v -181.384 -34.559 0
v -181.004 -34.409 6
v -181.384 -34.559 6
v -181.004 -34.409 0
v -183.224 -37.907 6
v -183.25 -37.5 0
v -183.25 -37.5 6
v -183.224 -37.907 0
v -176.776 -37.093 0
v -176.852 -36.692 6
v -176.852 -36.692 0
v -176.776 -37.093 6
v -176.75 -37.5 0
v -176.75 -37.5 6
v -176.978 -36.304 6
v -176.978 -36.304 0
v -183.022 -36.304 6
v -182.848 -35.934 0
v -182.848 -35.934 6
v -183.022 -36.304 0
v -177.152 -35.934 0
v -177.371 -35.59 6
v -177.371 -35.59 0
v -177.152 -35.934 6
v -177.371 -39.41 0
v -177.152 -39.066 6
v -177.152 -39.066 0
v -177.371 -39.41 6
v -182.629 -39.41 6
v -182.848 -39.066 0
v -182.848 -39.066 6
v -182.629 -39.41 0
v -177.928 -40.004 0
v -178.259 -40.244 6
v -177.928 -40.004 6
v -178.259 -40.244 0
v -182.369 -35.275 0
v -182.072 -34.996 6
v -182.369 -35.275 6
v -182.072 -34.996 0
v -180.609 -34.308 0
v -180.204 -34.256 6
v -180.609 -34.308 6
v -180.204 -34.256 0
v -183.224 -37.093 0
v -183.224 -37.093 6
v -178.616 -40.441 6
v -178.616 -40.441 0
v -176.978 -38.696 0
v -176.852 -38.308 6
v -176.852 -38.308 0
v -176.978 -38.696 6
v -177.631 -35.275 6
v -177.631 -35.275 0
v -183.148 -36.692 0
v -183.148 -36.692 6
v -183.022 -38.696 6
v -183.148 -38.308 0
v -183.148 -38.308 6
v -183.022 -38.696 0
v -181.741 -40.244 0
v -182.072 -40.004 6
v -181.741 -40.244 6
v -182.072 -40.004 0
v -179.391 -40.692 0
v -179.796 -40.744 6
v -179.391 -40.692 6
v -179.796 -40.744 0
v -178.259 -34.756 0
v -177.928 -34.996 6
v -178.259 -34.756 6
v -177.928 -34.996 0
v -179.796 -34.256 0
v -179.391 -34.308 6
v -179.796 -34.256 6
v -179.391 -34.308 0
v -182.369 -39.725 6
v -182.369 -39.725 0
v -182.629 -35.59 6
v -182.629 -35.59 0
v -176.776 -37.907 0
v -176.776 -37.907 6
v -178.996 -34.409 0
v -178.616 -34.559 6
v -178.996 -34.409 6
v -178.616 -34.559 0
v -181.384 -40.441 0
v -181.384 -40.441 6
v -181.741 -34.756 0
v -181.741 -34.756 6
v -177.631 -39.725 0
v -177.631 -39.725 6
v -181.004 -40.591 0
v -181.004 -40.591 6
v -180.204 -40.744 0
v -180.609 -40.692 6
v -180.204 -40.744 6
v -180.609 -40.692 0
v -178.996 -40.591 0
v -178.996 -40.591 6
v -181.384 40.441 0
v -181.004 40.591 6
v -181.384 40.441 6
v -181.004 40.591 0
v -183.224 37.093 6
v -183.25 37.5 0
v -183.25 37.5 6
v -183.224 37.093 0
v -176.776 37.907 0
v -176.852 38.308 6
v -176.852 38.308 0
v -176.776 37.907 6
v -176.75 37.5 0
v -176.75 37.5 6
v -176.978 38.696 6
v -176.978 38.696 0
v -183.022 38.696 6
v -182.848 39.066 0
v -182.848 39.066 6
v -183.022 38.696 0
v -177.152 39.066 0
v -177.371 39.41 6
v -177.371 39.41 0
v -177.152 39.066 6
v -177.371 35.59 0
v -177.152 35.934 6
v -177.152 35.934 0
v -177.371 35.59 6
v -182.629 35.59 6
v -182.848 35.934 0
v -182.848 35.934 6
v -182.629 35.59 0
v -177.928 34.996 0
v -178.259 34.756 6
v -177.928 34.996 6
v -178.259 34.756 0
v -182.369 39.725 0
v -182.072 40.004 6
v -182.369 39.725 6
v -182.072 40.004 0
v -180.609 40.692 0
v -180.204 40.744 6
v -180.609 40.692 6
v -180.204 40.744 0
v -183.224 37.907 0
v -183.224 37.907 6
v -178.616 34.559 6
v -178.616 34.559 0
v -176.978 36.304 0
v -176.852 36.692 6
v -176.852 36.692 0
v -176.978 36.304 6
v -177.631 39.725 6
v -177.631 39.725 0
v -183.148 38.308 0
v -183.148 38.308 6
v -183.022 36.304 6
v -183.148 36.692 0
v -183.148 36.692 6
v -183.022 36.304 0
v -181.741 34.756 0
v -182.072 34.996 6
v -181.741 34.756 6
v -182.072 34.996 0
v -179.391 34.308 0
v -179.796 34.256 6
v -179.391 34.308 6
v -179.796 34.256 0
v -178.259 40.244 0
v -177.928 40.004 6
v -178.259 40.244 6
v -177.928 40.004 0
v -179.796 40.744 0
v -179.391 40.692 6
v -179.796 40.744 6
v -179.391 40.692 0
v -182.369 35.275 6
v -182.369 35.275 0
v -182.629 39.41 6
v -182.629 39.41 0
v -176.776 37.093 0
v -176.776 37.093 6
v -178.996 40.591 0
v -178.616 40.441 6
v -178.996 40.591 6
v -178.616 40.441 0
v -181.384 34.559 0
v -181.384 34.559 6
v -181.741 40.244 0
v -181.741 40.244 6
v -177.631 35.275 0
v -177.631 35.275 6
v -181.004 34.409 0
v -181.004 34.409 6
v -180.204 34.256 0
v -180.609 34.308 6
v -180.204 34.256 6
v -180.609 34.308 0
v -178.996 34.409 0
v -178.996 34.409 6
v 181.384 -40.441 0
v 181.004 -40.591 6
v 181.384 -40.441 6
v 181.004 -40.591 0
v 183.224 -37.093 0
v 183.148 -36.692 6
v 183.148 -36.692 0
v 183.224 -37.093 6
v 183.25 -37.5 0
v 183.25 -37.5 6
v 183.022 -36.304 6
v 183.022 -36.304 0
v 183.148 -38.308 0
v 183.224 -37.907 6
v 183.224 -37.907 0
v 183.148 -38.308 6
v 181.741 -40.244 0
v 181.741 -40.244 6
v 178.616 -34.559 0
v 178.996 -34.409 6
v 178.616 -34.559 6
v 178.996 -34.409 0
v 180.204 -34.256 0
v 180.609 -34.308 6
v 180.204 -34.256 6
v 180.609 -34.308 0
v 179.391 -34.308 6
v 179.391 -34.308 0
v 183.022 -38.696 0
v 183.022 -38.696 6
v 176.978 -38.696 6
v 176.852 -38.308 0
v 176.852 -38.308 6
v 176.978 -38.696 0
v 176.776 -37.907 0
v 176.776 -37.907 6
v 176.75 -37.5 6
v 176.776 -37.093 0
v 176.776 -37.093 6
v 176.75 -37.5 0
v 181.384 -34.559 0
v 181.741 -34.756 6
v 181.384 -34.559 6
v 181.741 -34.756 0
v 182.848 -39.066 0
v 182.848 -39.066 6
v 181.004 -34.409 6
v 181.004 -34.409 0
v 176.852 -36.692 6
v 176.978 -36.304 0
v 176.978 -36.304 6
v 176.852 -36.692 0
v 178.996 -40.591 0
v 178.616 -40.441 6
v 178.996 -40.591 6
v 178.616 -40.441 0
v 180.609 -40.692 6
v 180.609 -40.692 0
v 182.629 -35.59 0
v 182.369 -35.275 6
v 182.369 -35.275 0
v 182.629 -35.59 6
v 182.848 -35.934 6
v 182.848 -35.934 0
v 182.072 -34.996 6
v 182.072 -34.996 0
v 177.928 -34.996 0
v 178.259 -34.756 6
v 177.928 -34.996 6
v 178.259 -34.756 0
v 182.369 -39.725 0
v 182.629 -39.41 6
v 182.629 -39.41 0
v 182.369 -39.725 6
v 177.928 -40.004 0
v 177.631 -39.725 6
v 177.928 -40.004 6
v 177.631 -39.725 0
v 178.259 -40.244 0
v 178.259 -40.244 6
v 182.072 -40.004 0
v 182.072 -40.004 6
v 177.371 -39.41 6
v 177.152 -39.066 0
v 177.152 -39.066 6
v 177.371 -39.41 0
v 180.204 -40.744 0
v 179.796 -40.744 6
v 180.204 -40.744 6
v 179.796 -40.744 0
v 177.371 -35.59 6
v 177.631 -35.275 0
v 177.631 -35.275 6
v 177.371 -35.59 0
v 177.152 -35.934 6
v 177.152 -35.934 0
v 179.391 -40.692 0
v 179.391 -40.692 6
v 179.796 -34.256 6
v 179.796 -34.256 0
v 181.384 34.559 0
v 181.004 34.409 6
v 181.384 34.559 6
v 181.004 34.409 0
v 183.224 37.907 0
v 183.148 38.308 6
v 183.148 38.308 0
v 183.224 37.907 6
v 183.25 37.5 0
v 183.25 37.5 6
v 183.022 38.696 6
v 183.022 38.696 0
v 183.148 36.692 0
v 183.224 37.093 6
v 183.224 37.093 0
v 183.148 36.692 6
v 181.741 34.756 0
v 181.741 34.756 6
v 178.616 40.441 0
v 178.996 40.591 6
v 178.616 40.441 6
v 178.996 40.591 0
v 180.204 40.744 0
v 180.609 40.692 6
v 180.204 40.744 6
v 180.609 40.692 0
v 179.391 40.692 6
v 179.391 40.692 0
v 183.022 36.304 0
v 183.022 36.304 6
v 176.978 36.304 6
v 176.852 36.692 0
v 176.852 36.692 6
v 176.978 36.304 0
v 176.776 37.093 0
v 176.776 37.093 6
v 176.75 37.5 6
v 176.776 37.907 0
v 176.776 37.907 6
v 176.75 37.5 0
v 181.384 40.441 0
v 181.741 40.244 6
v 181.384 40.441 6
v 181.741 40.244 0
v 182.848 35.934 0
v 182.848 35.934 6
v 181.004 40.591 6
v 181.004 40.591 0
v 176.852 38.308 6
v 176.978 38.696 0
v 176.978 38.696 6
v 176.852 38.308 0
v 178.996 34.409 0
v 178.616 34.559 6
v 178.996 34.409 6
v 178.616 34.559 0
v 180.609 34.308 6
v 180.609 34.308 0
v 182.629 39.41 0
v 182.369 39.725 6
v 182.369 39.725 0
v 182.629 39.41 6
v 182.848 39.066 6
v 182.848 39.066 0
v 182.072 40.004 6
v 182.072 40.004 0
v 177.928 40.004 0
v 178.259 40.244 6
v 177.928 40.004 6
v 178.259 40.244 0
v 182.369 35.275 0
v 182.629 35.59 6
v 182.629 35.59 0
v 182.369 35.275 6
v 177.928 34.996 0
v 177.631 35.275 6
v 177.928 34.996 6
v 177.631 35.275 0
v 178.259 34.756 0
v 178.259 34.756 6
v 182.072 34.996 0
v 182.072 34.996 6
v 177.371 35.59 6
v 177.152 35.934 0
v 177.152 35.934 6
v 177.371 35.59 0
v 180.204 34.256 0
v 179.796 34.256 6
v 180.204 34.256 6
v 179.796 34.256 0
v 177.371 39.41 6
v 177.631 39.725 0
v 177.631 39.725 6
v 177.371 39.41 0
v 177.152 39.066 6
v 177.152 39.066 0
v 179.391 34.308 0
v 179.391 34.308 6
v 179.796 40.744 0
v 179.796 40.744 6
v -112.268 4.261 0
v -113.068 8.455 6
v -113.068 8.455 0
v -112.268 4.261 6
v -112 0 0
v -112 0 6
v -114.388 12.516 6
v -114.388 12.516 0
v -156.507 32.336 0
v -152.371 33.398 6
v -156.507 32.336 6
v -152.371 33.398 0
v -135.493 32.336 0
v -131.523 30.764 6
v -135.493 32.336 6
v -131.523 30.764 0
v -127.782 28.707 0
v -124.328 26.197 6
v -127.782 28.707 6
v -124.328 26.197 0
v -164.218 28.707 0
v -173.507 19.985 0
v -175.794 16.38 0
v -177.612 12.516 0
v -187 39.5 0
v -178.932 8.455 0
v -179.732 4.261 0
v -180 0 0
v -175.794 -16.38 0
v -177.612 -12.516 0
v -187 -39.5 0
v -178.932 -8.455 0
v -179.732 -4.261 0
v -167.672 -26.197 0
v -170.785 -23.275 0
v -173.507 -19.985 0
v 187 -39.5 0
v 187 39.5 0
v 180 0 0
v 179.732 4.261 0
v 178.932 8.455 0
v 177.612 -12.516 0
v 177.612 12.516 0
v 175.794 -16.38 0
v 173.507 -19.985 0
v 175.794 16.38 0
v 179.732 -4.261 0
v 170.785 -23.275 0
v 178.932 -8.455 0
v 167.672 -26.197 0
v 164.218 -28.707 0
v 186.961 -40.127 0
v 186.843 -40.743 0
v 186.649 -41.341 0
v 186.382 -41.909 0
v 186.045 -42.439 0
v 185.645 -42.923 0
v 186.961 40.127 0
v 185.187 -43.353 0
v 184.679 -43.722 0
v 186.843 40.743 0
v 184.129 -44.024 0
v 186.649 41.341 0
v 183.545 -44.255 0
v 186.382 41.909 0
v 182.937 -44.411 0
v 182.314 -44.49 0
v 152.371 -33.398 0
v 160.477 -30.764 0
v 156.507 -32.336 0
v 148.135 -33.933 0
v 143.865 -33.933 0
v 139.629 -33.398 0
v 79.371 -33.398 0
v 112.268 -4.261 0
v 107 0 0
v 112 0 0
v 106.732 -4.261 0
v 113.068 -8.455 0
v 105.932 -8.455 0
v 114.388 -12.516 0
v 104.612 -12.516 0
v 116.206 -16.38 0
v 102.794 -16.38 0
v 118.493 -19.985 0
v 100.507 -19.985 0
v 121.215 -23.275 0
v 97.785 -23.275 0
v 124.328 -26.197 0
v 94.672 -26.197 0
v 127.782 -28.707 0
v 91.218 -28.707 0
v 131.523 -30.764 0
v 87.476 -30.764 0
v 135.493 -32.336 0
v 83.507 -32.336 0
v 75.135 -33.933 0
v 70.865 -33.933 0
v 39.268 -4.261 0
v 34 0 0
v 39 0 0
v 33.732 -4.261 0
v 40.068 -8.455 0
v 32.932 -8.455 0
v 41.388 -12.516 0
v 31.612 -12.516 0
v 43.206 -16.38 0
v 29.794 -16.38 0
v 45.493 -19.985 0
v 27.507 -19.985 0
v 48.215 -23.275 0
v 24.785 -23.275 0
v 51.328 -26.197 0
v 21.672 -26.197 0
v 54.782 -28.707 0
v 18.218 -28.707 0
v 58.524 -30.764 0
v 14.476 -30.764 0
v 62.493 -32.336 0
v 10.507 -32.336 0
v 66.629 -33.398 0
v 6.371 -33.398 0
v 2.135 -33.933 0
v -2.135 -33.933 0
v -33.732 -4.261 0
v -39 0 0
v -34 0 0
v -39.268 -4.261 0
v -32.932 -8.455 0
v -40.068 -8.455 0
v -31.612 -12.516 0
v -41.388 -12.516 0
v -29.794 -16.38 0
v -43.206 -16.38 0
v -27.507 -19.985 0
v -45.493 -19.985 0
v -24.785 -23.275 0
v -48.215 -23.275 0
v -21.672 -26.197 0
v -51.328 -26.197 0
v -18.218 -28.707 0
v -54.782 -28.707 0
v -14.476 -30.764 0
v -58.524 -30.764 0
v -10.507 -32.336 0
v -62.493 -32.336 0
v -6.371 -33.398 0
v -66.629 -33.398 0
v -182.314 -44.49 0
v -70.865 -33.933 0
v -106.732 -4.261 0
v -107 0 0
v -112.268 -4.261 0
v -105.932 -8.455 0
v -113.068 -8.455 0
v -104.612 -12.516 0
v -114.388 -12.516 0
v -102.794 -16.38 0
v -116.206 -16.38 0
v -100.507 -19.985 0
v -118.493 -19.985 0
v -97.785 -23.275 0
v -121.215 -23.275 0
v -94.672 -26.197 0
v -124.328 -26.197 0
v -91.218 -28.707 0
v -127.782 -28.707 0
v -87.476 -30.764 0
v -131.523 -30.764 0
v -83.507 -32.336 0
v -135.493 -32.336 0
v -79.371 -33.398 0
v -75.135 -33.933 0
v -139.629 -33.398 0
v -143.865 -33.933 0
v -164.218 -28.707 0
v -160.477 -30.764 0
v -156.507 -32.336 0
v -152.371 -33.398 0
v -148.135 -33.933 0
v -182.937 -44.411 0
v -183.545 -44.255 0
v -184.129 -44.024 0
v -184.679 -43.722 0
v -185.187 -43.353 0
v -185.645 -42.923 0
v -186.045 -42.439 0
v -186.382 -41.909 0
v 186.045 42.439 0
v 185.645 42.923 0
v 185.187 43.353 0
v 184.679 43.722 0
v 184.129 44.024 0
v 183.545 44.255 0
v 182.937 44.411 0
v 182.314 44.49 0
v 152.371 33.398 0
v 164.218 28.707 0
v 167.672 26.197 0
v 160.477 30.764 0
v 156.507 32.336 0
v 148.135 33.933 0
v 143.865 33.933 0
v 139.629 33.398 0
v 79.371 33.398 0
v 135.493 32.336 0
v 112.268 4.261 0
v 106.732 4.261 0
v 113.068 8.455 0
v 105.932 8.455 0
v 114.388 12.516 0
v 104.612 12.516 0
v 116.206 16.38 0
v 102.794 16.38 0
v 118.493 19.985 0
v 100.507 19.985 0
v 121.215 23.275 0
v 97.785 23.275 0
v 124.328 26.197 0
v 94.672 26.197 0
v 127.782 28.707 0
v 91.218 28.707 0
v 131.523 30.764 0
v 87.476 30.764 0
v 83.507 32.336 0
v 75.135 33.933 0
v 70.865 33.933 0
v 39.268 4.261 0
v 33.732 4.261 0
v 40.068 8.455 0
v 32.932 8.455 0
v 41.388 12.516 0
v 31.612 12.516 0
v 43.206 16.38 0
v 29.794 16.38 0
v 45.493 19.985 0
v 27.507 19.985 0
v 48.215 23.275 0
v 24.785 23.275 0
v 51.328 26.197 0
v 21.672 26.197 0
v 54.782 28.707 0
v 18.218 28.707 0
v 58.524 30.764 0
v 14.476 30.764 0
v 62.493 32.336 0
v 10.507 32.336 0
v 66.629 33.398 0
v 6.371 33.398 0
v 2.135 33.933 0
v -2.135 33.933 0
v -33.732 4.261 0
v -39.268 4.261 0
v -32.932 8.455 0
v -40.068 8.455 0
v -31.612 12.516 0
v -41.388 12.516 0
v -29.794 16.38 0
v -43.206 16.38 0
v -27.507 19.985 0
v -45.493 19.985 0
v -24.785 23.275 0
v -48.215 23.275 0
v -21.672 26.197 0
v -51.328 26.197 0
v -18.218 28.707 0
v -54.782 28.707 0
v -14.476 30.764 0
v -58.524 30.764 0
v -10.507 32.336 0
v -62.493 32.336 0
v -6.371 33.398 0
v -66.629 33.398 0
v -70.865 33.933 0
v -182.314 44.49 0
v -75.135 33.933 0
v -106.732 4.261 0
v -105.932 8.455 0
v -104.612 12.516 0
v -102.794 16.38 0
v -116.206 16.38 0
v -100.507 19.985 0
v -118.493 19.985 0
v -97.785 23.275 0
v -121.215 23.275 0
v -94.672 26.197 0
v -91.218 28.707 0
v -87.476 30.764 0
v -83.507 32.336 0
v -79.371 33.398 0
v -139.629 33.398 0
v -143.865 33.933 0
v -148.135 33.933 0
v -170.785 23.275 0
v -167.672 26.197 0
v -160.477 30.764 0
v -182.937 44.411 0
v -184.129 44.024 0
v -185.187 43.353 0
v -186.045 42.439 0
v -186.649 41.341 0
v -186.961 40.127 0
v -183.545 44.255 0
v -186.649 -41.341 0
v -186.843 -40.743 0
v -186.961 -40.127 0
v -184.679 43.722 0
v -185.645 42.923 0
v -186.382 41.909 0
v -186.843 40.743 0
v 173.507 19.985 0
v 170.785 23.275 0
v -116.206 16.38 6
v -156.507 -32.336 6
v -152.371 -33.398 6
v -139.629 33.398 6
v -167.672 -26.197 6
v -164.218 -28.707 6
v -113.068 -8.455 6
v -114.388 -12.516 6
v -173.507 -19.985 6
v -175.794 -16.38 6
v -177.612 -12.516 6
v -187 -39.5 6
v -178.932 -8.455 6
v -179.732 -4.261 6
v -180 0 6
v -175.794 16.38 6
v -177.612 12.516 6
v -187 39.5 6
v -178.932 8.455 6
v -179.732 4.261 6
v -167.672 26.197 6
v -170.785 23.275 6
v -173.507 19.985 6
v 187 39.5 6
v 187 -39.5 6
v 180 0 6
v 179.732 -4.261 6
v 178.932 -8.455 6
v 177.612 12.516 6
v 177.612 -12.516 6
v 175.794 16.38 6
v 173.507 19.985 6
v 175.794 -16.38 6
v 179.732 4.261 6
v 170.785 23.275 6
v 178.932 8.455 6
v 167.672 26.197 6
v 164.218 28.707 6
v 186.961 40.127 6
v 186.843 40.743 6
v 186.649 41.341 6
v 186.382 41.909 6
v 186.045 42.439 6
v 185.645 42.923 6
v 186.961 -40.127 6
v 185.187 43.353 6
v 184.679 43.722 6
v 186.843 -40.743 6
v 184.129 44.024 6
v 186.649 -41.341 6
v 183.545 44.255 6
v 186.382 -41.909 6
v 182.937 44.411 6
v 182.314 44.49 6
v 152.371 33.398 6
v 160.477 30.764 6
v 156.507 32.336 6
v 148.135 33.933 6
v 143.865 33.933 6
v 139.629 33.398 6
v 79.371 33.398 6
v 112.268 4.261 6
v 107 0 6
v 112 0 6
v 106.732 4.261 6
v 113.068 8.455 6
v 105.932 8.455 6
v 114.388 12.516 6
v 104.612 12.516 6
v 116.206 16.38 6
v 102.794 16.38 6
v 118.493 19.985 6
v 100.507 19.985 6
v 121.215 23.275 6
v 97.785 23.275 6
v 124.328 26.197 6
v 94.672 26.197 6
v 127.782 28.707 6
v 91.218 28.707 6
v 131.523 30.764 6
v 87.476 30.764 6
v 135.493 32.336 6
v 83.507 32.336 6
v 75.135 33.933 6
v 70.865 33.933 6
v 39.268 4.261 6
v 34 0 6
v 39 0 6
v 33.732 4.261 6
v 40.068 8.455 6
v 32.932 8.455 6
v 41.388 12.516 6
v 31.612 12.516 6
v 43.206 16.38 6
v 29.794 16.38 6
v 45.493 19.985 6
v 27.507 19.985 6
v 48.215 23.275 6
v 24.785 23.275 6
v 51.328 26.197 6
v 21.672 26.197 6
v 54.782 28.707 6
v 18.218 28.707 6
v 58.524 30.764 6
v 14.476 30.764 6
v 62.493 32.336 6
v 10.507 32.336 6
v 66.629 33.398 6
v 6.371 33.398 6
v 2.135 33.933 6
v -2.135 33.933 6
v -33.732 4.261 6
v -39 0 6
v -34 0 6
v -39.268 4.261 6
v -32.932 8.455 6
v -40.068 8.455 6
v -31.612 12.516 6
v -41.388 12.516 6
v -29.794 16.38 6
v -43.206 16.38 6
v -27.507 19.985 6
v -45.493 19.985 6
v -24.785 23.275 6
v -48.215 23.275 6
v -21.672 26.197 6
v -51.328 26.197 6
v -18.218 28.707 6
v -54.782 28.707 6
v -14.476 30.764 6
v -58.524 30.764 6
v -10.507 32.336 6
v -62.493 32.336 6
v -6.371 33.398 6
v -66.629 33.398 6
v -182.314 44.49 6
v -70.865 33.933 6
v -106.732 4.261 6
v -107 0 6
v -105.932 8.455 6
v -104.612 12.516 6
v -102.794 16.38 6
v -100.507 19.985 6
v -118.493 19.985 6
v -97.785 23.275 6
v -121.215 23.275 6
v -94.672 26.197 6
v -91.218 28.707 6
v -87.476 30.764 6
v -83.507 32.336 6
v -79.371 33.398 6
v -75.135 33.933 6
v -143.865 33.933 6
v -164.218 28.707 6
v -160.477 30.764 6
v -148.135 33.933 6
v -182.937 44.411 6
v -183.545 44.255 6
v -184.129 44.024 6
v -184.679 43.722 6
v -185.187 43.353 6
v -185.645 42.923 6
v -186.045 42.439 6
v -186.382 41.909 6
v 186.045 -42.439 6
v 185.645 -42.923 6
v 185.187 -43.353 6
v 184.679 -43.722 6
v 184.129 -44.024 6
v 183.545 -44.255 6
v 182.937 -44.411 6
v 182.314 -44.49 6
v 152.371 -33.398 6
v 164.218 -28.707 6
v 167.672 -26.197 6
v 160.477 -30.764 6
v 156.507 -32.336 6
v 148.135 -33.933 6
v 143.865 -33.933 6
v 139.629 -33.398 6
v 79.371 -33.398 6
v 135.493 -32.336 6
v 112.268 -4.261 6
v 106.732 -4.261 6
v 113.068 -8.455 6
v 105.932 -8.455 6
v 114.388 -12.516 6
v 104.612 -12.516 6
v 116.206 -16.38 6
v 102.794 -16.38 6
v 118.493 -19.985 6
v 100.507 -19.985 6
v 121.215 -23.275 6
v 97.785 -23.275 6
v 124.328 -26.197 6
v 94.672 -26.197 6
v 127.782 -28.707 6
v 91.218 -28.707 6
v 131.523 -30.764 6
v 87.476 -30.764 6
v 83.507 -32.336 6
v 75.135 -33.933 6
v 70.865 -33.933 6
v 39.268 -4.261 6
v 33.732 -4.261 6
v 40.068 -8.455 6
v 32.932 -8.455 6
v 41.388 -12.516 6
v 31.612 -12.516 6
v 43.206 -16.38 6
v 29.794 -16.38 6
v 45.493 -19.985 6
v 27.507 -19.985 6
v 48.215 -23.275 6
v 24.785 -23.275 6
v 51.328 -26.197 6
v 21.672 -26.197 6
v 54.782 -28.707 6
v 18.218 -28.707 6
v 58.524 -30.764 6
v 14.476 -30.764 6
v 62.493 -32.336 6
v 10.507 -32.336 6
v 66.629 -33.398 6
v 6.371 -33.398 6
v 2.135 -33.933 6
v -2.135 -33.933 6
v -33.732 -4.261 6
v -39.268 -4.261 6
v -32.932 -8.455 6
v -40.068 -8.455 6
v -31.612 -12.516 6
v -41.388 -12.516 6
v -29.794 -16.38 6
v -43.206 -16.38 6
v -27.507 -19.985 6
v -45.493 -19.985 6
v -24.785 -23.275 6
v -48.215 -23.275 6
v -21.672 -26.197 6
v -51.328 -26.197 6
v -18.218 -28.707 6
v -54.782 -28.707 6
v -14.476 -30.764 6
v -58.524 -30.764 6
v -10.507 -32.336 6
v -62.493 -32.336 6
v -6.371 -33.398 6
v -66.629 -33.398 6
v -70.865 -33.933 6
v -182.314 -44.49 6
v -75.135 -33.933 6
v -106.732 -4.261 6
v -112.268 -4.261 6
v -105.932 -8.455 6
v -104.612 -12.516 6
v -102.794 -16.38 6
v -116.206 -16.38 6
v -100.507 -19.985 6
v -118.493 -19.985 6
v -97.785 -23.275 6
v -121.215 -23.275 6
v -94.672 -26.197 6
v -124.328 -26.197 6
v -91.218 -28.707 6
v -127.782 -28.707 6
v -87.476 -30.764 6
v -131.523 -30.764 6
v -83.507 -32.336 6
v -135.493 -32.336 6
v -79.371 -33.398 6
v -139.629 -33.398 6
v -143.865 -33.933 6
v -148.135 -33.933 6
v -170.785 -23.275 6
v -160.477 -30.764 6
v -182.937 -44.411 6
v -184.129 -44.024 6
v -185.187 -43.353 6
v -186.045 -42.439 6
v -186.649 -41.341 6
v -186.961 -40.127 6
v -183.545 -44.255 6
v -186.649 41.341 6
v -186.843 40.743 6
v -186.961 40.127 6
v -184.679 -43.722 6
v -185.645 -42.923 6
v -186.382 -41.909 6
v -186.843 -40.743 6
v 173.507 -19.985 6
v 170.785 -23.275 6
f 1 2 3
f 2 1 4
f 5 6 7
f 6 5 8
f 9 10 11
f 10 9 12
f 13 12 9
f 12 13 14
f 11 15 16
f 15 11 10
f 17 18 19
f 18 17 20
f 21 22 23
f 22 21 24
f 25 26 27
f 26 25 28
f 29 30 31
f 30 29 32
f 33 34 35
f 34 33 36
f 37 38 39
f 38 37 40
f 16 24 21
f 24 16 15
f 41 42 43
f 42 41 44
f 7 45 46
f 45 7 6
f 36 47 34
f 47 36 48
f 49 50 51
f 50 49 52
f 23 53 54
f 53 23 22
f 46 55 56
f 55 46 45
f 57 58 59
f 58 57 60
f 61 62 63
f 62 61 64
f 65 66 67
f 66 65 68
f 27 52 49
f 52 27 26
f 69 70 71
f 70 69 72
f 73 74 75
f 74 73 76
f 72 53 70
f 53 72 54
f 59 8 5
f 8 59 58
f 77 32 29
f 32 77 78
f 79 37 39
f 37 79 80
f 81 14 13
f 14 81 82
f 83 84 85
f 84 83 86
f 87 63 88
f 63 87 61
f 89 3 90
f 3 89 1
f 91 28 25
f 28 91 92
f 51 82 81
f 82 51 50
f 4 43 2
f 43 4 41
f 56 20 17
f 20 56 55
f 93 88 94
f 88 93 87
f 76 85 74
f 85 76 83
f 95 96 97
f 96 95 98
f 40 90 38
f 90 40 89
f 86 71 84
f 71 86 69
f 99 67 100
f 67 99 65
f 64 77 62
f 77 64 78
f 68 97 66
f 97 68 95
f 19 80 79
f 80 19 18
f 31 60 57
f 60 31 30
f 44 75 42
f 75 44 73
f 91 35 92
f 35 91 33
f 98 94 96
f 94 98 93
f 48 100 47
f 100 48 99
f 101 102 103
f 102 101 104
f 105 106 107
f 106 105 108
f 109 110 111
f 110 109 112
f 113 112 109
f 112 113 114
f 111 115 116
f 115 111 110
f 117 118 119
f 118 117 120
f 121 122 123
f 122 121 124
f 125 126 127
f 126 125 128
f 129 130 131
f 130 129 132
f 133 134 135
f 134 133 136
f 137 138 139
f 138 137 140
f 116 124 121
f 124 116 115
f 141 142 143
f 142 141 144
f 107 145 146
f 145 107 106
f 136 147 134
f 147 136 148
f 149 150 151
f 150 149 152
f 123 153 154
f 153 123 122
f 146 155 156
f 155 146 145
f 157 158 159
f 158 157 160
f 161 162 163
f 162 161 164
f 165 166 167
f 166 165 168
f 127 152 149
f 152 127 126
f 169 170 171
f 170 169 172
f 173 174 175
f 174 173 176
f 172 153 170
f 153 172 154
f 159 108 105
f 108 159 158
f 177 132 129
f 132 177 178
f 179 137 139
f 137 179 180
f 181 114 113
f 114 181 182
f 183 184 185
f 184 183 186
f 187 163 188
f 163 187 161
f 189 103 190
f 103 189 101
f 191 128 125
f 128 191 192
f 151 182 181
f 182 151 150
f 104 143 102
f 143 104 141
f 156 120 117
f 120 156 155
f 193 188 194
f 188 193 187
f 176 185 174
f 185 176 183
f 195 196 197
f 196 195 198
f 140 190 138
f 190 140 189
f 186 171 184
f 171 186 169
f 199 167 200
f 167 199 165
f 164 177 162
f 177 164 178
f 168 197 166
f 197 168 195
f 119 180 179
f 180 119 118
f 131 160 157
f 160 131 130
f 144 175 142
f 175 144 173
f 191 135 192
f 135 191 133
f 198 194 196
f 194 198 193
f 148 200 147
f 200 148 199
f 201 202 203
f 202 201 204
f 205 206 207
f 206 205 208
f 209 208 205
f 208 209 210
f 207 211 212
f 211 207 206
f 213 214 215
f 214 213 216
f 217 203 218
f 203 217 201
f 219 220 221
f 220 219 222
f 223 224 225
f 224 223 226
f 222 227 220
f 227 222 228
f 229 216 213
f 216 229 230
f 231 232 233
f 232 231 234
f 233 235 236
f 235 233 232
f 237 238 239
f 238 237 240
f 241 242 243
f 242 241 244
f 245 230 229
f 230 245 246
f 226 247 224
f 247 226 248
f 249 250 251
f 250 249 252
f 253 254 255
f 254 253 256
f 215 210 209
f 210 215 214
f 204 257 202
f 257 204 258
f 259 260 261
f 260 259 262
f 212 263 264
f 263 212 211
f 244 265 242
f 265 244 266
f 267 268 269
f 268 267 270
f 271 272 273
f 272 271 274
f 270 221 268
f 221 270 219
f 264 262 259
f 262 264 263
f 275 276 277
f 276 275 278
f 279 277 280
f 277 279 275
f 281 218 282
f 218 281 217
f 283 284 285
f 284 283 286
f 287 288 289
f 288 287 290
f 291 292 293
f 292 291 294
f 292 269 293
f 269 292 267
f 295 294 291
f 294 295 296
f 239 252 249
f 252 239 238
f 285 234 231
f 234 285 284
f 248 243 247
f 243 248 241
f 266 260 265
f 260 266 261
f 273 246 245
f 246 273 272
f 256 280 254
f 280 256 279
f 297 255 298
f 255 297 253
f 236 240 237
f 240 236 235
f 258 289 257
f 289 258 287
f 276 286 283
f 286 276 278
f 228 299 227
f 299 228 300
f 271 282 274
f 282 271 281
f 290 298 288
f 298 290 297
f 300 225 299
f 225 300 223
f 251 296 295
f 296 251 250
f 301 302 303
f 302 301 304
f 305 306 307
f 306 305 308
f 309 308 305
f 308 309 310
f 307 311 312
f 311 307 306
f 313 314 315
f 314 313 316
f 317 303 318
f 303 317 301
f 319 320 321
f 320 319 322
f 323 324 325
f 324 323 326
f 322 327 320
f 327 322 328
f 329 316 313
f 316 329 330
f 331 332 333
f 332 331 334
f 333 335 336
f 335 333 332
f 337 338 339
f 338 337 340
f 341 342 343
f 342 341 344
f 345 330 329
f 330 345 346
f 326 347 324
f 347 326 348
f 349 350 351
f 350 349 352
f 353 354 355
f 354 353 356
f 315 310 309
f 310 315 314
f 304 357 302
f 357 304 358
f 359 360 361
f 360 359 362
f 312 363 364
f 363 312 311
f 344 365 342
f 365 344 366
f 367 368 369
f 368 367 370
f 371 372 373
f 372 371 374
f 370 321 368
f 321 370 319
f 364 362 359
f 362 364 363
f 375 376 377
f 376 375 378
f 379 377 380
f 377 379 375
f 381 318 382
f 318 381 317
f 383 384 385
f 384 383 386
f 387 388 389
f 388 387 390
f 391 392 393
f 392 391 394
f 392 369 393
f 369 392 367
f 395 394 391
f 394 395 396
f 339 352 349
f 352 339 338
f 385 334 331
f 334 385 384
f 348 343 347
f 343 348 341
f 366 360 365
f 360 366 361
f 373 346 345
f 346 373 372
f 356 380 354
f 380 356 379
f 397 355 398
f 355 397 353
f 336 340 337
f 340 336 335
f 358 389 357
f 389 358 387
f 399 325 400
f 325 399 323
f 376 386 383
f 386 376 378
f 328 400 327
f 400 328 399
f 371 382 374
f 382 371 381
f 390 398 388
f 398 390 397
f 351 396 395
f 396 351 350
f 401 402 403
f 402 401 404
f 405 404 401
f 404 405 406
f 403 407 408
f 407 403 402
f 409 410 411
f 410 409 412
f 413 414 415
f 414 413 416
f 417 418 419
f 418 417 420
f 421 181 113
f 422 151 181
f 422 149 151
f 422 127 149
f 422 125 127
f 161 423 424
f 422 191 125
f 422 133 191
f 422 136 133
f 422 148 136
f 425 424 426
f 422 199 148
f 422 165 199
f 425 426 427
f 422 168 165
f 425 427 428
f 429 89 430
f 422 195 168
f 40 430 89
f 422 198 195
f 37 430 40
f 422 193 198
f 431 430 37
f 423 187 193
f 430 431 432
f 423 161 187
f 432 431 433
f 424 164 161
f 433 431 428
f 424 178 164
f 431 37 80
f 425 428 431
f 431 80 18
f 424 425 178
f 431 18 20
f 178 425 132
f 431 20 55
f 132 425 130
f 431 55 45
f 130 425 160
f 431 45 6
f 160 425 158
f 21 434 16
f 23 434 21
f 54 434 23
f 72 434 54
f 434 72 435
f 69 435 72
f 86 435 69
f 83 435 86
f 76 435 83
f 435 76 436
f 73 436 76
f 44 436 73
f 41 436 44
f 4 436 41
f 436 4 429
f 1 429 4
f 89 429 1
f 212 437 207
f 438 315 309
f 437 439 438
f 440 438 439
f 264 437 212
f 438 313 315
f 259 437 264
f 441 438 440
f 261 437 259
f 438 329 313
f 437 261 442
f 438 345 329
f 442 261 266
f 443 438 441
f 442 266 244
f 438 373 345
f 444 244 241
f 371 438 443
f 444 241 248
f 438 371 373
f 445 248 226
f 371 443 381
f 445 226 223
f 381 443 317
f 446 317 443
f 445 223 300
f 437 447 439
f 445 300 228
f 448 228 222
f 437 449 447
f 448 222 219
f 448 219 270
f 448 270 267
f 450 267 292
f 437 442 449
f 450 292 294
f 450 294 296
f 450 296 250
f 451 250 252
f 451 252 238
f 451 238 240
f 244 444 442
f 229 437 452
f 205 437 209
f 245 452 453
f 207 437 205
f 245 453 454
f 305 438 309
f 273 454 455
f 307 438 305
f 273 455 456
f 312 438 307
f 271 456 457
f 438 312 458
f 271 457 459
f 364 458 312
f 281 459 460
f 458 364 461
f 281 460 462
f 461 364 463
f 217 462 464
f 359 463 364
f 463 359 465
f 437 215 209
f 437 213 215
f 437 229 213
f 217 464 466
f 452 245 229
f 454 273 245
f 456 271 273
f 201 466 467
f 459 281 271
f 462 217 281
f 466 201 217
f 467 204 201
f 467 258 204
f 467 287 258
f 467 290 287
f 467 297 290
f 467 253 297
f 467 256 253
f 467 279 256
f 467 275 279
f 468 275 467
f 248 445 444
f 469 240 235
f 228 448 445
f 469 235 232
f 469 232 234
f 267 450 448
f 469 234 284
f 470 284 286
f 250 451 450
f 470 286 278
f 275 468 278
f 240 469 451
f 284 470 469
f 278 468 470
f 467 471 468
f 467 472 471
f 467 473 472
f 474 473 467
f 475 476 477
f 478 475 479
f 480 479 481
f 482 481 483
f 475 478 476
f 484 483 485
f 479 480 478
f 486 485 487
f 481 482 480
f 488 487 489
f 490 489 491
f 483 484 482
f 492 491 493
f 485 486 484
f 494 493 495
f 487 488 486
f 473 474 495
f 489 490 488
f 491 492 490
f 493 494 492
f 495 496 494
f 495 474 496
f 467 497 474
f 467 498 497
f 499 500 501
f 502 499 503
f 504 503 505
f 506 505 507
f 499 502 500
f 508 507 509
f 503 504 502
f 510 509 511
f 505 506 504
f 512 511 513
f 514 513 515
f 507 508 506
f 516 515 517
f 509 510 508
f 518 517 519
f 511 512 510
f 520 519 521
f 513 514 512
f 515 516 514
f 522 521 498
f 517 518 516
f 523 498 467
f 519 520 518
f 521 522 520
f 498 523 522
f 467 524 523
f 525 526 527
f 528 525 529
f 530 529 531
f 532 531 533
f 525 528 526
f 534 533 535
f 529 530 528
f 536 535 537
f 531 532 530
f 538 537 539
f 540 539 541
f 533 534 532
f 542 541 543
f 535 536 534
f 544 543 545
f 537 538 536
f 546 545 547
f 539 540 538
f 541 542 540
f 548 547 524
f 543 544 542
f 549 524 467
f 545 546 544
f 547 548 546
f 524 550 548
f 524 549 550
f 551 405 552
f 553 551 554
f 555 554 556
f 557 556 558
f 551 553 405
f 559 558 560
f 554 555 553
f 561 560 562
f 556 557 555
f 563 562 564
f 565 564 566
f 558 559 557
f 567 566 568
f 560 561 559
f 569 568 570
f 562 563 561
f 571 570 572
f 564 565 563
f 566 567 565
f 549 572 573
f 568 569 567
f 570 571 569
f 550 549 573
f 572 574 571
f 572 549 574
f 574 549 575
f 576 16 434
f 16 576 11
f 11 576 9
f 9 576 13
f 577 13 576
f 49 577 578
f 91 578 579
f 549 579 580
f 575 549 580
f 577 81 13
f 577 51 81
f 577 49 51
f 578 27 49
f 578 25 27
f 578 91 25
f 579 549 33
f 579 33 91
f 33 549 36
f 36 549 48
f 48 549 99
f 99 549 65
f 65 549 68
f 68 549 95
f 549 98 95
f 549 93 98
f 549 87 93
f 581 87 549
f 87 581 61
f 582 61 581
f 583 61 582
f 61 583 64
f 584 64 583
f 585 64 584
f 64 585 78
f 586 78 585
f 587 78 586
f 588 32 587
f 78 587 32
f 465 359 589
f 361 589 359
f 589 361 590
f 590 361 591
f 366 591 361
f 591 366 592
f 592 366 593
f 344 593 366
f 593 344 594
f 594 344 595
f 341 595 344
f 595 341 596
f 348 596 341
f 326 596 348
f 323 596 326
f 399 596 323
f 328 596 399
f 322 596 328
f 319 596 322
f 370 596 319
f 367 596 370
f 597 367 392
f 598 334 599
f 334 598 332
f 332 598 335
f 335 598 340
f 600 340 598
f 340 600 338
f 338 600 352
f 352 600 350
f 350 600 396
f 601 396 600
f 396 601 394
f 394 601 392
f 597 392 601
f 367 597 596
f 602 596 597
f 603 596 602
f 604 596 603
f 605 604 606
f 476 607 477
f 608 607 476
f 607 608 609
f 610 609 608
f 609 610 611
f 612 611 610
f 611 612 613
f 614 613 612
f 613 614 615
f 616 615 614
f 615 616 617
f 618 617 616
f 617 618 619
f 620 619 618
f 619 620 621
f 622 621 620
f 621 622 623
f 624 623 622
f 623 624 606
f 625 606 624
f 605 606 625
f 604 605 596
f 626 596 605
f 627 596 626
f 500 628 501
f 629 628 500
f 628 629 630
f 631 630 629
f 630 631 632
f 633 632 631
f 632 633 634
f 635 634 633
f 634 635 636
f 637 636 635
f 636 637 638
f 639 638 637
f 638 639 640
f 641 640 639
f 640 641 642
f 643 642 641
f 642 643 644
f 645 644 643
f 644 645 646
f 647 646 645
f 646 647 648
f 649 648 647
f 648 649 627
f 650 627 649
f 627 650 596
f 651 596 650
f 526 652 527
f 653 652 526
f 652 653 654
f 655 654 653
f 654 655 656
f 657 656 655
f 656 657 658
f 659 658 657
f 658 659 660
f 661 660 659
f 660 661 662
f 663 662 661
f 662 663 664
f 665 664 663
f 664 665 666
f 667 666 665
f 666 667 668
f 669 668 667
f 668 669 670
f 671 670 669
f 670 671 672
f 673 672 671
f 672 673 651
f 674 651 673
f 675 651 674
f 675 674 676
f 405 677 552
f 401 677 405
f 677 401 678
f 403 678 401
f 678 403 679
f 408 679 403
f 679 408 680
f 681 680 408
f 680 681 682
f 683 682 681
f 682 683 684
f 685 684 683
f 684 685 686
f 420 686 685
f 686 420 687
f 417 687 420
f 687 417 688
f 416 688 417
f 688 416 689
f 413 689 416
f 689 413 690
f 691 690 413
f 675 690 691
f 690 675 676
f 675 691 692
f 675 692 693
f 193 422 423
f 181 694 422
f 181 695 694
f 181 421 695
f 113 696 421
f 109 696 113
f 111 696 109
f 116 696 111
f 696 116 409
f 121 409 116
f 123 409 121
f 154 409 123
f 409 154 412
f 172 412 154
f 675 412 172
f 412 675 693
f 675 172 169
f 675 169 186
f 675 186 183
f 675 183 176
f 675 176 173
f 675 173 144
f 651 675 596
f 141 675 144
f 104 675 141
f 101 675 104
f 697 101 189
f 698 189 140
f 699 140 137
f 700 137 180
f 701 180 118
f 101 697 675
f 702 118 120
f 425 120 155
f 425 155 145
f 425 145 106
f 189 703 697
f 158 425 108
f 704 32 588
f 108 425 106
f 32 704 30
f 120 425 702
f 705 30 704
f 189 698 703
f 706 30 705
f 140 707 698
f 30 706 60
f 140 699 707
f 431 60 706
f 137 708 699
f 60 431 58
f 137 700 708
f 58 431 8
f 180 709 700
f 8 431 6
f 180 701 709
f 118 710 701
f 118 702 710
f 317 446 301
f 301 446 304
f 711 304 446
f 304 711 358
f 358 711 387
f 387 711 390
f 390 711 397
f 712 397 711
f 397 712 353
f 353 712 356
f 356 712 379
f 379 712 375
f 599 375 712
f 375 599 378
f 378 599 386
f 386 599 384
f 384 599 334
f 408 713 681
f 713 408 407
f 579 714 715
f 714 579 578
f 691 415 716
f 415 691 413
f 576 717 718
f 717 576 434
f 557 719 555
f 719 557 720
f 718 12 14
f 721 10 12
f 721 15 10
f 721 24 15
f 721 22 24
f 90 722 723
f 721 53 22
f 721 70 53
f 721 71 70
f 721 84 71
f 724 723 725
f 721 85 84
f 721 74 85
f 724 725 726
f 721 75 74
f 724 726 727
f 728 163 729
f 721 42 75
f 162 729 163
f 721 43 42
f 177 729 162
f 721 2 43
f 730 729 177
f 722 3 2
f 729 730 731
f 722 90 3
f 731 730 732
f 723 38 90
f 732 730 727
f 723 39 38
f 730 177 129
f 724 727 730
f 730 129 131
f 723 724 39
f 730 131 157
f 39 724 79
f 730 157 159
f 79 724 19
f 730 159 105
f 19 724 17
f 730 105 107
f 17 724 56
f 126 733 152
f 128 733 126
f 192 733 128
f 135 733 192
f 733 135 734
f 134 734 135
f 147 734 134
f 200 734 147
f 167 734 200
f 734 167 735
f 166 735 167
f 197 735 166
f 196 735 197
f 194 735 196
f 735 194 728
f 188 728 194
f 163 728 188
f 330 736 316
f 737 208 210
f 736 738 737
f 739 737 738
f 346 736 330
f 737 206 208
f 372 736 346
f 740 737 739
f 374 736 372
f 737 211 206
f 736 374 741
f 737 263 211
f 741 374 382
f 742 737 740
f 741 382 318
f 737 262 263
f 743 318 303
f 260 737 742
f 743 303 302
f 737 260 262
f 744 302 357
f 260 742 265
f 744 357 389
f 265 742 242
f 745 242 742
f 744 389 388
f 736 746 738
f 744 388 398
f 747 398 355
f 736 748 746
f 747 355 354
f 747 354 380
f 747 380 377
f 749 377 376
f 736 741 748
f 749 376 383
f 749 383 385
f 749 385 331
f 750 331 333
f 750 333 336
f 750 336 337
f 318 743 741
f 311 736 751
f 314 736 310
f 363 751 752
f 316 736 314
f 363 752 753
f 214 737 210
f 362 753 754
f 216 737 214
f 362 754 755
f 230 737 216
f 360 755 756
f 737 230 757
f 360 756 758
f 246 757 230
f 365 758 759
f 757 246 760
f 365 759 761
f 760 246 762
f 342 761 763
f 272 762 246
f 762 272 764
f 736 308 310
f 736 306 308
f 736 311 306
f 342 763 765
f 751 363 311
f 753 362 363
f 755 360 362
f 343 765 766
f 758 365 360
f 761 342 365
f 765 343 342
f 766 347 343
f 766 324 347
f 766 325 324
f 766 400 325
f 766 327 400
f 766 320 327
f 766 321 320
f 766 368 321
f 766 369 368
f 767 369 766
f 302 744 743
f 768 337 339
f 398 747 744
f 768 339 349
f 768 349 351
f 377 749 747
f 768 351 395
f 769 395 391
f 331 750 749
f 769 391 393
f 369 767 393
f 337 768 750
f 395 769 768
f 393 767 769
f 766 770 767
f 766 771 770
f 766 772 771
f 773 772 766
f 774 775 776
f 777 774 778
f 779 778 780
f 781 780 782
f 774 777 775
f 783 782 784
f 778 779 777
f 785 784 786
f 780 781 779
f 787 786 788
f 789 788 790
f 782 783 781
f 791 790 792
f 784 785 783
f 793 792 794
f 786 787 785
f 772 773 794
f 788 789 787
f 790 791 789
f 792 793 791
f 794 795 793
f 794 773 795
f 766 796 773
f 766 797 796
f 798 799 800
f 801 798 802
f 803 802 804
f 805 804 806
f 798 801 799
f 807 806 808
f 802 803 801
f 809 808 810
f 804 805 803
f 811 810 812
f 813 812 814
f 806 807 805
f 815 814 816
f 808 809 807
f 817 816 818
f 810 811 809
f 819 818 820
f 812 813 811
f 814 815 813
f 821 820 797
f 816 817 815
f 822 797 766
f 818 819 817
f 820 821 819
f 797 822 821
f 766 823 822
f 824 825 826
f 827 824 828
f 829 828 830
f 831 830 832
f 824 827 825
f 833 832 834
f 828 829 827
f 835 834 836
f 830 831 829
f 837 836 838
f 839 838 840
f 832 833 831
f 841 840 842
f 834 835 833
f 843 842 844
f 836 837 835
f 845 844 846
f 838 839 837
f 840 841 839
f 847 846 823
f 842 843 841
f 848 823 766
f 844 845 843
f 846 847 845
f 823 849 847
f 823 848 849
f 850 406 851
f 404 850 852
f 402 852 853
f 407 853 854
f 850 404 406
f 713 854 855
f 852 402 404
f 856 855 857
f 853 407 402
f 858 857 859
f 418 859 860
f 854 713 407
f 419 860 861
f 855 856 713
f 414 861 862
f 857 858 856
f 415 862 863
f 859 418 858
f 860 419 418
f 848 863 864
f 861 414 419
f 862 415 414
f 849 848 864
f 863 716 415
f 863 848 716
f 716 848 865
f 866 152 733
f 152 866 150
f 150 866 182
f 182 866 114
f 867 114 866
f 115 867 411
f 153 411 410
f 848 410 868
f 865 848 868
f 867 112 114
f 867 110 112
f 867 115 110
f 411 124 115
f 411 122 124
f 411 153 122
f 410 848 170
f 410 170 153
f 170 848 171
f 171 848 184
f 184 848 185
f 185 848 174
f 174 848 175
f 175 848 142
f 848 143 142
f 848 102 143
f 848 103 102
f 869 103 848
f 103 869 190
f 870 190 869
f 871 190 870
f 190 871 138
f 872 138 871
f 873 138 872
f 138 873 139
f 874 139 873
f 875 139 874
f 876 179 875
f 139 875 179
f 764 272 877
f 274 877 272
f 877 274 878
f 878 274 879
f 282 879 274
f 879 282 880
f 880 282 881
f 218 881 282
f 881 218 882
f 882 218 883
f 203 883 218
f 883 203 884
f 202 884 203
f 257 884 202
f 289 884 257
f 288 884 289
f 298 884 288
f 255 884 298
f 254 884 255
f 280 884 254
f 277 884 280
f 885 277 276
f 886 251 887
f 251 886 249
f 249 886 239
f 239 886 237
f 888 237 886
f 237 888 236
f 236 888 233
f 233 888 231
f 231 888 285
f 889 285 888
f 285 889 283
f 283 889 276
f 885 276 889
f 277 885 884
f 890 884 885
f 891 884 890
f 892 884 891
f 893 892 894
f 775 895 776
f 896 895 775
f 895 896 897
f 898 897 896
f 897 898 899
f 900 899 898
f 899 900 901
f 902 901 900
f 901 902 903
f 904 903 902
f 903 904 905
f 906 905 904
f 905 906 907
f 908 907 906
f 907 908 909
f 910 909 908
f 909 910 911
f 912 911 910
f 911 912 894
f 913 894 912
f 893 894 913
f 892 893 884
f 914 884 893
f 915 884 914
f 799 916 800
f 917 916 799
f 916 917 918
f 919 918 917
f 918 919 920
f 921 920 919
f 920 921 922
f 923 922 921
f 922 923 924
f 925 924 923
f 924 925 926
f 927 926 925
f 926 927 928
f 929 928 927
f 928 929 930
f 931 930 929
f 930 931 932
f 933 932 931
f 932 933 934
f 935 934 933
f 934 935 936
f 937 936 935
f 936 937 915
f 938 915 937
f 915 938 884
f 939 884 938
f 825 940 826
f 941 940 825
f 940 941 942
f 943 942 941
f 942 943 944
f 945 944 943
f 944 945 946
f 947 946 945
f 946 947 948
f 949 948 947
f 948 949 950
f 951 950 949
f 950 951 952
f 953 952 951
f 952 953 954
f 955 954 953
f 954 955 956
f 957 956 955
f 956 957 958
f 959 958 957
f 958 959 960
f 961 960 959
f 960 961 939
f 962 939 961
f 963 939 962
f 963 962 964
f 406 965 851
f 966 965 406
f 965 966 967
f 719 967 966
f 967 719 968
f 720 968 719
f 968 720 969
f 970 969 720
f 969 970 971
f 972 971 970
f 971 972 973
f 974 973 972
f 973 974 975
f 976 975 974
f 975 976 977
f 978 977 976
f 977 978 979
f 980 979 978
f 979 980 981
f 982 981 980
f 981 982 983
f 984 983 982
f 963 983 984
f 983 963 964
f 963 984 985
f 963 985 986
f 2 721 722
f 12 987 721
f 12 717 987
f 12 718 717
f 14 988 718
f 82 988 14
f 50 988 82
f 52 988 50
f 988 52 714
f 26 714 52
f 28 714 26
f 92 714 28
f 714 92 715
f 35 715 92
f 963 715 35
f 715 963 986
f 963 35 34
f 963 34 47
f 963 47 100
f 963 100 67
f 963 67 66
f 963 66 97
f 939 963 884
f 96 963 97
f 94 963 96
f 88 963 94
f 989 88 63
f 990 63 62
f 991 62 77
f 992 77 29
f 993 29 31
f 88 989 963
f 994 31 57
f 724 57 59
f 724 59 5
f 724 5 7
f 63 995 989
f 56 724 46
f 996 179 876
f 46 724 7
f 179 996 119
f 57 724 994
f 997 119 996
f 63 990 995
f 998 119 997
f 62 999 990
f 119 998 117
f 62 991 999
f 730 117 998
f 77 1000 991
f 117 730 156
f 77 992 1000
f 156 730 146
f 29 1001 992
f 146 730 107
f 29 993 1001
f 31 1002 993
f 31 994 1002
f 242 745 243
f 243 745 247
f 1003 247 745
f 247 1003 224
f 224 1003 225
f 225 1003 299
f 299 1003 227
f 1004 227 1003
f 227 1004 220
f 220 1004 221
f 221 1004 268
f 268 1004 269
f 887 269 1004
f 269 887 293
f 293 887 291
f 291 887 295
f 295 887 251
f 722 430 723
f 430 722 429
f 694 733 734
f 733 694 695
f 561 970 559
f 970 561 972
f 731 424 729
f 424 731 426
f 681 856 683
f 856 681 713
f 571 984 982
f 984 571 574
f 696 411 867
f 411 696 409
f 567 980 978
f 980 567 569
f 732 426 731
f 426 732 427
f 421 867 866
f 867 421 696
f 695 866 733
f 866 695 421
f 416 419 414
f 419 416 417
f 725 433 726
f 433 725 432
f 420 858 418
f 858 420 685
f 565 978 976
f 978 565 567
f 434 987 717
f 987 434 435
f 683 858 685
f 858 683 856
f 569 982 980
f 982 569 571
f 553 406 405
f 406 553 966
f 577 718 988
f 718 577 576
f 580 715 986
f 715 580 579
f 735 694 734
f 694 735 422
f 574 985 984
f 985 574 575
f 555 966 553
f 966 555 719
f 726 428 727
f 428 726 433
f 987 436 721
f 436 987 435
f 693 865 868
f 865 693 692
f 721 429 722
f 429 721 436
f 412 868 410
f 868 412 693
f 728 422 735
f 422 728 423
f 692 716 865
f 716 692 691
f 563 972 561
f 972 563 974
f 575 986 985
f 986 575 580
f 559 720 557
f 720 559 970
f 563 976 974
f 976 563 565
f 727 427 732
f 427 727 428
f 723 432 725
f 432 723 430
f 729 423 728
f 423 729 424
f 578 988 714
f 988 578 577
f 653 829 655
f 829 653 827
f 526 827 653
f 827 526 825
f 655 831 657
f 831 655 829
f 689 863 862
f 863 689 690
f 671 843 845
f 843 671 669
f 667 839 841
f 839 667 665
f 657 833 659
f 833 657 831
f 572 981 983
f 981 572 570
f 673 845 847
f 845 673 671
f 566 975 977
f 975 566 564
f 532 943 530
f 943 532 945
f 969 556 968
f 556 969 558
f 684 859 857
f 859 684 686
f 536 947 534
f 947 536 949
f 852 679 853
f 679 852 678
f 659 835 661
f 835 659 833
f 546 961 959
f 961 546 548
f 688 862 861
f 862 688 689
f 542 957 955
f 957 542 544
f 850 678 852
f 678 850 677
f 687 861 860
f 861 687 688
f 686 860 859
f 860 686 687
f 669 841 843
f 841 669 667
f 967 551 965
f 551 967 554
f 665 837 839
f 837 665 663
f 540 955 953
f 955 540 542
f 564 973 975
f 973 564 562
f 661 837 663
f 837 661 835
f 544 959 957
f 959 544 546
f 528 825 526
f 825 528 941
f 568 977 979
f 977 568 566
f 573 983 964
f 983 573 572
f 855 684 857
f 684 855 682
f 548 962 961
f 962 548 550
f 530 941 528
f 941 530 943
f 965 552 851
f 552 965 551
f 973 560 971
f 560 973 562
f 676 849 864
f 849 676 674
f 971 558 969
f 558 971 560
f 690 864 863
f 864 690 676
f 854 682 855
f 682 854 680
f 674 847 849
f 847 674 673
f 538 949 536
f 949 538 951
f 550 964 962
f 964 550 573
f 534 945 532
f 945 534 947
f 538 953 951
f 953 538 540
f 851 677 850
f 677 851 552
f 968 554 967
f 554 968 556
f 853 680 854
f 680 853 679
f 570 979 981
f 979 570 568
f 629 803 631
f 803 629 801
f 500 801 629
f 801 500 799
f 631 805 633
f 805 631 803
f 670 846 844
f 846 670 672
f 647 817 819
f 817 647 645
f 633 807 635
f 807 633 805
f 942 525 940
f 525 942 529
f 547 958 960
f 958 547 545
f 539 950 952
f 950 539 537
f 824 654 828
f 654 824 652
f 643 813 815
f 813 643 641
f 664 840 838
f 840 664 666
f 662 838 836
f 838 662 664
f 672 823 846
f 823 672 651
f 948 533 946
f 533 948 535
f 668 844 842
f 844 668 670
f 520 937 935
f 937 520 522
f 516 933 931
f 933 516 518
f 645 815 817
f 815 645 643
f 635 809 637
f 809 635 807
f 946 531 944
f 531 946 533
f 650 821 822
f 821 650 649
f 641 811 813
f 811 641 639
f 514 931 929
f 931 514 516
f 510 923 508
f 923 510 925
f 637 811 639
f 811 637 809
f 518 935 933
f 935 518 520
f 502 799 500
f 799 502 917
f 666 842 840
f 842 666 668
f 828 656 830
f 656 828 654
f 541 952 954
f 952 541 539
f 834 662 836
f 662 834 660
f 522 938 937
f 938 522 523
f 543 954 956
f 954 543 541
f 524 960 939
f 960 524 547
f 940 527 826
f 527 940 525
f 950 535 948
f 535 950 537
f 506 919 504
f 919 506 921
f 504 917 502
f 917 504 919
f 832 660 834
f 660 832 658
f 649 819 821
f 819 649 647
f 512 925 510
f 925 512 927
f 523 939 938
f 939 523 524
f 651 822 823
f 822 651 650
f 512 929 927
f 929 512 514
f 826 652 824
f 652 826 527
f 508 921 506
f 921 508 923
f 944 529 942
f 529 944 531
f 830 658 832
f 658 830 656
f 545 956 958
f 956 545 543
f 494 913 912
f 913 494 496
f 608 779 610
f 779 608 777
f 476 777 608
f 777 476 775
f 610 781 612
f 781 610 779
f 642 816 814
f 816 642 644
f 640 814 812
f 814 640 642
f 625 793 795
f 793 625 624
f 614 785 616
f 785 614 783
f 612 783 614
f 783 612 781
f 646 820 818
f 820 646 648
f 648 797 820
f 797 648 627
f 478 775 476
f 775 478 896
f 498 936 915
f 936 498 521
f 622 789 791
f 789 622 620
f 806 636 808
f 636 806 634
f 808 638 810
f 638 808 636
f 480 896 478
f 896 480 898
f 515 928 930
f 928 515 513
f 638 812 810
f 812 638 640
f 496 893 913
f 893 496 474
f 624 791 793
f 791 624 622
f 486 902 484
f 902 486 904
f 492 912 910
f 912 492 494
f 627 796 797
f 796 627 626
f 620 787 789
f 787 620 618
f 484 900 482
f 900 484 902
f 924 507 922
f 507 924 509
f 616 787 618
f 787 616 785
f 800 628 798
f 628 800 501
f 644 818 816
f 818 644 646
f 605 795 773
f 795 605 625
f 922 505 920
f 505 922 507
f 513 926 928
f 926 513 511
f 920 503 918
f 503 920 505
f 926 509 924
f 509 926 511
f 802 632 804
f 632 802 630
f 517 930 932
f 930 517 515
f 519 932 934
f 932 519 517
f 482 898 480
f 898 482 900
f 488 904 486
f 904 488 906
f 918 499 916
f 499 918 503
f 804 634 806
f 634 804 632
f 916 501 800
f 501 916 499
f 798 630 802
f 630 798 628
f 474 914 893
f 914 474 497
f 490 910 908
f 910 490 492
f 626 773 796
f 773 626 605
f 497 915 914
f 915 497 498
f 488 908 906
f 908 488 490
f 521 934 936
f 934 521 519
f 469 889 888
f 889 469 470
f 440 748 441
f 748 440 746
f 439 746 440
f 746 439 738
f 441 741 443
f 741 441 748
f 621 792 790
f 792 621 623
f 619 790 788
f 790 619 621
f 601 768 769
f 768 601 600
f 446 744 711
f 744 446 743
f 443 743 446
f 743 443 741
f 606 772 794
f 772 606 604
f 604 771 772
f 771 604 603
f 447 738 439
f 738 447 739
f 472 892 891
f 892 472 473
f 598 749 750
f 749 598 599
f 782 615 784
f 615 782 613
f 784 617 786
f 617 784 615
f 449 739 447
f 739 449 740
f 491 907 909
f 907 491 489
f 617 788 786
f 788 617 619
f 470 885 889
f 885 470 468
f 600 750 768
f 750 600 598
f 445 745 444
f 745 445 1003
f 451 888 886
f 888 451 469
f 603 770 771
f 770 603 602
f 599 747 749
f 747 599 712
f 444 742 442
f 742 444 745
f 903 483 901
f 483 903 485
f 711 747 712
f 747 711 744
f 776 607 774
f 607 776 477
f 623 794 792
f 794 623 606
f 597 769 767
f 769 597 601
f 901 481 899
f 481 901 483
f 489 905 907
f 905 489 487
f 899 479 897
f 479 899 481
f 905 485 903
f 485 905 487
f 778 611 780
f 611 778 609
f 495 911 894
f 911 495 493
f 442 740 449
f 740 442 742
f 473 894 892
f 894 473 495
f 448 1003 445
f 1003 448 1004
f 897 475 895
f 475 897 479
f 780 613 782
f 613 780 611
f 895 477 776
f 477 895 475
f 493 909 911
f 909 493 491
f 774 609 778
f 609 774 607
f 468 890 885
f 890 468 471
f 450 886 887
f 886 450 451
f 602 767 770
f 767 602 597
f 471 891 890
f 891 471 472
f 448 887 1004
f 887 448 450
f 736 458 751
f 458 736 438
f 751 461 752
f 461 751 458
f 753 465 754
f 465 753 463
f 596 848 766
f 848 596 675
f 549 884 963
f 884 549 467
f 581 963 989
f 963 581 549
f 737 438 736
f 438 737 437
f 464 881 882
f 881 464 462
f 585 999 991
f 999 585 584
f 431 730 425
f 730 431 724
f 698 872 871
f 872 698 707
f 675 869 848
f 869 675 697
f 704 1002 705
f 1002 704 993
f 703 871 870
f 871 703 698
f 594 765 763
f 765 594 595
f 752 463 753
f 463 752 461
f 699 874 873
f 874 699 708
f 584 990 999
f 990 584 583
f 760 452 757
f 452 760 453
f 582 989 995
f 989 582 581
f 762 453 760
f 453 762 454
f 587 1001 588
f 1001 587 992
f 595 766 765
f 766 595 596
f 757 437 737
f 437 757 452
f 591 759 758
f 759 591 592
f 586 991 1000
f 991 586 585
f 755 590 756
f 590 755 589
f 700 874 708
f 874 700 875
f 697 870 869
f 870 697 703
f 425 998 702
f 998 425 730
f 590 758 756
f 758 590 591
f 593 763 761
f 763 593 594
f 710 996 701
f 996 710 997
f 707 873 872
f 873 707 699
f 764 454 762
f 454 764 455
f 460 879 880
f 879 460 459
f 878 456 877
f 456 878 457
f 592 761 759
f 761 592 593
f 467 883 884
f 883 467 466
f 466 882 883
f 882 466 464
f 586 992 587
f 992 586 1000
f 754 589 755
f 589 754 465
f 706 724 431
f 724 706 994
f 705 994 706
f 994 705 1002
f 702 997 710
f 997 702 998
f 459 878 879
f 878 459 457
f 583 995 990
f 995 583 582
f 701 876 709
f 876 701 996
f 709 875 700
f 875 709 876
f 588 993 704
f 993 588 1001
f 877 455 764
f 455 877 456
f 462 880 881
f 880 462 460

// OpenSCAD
$fn = 50;


difference() {
	union() {
		hull() {
			translate(v = [-182.0000000000, 39.5000000000, 0]) {
				cylinder(h = 6, r = 5);
			}
			translate(v = [182.0000000000, 39.5000000000, 0]) {
				cylinder(h = 6, r = 5);
			}
			translate(v = [-182.0000000000, -39.5000000000, 0]) {
				cylinder(h = 6, r = 5);
			}
			translate(v = [182.0000000000, -39.5000000000, 0]) {
				cylinder(h = 6, r = 5);
			}
		}
	}
	union() {
		#translate(v = [-180.0000000000, -37.5000000000, -100.0000000000]) {
			cylinder(h = 200, r = 3.2500000000);
		}
		#translate(v = [-180.0000000000, 37.5000000000, -100.0000000000]) {
			cylinder(h = 200, r = 3.2500000000);
		}
		#translate(v = [180.0000000000, -37.5000000000, -100.0000000000]) {
			cylinder(h = 200, r = 3.2500000000);
		}
		#translate(v = [180.0000000000, 37.5000000000, -100.0000000000]) {
			cylinder(h = 200, r = 3.2500000000);
		}
		#translate(v = [-146.0000000000, 0, 0]) {
			cylinder(h = 6, r = 34.0000000000);
		}
		#translate(v = [-73.0000000000, 0, 0]) {
			cylinder(h = 6, r = 34.0000000000);
		}
		#cylinder(h = 6, r = 34.0000000000);
		#translate(v = [73.0000000000, 0, 0]) {
			cylinder(h = 6, r = 34.0000000000);
		}
		#translate(v = [146.0000000000, 0, 0]) {
			cylinder(h = 6, r = 34.0000000000);
		}
	}
}
